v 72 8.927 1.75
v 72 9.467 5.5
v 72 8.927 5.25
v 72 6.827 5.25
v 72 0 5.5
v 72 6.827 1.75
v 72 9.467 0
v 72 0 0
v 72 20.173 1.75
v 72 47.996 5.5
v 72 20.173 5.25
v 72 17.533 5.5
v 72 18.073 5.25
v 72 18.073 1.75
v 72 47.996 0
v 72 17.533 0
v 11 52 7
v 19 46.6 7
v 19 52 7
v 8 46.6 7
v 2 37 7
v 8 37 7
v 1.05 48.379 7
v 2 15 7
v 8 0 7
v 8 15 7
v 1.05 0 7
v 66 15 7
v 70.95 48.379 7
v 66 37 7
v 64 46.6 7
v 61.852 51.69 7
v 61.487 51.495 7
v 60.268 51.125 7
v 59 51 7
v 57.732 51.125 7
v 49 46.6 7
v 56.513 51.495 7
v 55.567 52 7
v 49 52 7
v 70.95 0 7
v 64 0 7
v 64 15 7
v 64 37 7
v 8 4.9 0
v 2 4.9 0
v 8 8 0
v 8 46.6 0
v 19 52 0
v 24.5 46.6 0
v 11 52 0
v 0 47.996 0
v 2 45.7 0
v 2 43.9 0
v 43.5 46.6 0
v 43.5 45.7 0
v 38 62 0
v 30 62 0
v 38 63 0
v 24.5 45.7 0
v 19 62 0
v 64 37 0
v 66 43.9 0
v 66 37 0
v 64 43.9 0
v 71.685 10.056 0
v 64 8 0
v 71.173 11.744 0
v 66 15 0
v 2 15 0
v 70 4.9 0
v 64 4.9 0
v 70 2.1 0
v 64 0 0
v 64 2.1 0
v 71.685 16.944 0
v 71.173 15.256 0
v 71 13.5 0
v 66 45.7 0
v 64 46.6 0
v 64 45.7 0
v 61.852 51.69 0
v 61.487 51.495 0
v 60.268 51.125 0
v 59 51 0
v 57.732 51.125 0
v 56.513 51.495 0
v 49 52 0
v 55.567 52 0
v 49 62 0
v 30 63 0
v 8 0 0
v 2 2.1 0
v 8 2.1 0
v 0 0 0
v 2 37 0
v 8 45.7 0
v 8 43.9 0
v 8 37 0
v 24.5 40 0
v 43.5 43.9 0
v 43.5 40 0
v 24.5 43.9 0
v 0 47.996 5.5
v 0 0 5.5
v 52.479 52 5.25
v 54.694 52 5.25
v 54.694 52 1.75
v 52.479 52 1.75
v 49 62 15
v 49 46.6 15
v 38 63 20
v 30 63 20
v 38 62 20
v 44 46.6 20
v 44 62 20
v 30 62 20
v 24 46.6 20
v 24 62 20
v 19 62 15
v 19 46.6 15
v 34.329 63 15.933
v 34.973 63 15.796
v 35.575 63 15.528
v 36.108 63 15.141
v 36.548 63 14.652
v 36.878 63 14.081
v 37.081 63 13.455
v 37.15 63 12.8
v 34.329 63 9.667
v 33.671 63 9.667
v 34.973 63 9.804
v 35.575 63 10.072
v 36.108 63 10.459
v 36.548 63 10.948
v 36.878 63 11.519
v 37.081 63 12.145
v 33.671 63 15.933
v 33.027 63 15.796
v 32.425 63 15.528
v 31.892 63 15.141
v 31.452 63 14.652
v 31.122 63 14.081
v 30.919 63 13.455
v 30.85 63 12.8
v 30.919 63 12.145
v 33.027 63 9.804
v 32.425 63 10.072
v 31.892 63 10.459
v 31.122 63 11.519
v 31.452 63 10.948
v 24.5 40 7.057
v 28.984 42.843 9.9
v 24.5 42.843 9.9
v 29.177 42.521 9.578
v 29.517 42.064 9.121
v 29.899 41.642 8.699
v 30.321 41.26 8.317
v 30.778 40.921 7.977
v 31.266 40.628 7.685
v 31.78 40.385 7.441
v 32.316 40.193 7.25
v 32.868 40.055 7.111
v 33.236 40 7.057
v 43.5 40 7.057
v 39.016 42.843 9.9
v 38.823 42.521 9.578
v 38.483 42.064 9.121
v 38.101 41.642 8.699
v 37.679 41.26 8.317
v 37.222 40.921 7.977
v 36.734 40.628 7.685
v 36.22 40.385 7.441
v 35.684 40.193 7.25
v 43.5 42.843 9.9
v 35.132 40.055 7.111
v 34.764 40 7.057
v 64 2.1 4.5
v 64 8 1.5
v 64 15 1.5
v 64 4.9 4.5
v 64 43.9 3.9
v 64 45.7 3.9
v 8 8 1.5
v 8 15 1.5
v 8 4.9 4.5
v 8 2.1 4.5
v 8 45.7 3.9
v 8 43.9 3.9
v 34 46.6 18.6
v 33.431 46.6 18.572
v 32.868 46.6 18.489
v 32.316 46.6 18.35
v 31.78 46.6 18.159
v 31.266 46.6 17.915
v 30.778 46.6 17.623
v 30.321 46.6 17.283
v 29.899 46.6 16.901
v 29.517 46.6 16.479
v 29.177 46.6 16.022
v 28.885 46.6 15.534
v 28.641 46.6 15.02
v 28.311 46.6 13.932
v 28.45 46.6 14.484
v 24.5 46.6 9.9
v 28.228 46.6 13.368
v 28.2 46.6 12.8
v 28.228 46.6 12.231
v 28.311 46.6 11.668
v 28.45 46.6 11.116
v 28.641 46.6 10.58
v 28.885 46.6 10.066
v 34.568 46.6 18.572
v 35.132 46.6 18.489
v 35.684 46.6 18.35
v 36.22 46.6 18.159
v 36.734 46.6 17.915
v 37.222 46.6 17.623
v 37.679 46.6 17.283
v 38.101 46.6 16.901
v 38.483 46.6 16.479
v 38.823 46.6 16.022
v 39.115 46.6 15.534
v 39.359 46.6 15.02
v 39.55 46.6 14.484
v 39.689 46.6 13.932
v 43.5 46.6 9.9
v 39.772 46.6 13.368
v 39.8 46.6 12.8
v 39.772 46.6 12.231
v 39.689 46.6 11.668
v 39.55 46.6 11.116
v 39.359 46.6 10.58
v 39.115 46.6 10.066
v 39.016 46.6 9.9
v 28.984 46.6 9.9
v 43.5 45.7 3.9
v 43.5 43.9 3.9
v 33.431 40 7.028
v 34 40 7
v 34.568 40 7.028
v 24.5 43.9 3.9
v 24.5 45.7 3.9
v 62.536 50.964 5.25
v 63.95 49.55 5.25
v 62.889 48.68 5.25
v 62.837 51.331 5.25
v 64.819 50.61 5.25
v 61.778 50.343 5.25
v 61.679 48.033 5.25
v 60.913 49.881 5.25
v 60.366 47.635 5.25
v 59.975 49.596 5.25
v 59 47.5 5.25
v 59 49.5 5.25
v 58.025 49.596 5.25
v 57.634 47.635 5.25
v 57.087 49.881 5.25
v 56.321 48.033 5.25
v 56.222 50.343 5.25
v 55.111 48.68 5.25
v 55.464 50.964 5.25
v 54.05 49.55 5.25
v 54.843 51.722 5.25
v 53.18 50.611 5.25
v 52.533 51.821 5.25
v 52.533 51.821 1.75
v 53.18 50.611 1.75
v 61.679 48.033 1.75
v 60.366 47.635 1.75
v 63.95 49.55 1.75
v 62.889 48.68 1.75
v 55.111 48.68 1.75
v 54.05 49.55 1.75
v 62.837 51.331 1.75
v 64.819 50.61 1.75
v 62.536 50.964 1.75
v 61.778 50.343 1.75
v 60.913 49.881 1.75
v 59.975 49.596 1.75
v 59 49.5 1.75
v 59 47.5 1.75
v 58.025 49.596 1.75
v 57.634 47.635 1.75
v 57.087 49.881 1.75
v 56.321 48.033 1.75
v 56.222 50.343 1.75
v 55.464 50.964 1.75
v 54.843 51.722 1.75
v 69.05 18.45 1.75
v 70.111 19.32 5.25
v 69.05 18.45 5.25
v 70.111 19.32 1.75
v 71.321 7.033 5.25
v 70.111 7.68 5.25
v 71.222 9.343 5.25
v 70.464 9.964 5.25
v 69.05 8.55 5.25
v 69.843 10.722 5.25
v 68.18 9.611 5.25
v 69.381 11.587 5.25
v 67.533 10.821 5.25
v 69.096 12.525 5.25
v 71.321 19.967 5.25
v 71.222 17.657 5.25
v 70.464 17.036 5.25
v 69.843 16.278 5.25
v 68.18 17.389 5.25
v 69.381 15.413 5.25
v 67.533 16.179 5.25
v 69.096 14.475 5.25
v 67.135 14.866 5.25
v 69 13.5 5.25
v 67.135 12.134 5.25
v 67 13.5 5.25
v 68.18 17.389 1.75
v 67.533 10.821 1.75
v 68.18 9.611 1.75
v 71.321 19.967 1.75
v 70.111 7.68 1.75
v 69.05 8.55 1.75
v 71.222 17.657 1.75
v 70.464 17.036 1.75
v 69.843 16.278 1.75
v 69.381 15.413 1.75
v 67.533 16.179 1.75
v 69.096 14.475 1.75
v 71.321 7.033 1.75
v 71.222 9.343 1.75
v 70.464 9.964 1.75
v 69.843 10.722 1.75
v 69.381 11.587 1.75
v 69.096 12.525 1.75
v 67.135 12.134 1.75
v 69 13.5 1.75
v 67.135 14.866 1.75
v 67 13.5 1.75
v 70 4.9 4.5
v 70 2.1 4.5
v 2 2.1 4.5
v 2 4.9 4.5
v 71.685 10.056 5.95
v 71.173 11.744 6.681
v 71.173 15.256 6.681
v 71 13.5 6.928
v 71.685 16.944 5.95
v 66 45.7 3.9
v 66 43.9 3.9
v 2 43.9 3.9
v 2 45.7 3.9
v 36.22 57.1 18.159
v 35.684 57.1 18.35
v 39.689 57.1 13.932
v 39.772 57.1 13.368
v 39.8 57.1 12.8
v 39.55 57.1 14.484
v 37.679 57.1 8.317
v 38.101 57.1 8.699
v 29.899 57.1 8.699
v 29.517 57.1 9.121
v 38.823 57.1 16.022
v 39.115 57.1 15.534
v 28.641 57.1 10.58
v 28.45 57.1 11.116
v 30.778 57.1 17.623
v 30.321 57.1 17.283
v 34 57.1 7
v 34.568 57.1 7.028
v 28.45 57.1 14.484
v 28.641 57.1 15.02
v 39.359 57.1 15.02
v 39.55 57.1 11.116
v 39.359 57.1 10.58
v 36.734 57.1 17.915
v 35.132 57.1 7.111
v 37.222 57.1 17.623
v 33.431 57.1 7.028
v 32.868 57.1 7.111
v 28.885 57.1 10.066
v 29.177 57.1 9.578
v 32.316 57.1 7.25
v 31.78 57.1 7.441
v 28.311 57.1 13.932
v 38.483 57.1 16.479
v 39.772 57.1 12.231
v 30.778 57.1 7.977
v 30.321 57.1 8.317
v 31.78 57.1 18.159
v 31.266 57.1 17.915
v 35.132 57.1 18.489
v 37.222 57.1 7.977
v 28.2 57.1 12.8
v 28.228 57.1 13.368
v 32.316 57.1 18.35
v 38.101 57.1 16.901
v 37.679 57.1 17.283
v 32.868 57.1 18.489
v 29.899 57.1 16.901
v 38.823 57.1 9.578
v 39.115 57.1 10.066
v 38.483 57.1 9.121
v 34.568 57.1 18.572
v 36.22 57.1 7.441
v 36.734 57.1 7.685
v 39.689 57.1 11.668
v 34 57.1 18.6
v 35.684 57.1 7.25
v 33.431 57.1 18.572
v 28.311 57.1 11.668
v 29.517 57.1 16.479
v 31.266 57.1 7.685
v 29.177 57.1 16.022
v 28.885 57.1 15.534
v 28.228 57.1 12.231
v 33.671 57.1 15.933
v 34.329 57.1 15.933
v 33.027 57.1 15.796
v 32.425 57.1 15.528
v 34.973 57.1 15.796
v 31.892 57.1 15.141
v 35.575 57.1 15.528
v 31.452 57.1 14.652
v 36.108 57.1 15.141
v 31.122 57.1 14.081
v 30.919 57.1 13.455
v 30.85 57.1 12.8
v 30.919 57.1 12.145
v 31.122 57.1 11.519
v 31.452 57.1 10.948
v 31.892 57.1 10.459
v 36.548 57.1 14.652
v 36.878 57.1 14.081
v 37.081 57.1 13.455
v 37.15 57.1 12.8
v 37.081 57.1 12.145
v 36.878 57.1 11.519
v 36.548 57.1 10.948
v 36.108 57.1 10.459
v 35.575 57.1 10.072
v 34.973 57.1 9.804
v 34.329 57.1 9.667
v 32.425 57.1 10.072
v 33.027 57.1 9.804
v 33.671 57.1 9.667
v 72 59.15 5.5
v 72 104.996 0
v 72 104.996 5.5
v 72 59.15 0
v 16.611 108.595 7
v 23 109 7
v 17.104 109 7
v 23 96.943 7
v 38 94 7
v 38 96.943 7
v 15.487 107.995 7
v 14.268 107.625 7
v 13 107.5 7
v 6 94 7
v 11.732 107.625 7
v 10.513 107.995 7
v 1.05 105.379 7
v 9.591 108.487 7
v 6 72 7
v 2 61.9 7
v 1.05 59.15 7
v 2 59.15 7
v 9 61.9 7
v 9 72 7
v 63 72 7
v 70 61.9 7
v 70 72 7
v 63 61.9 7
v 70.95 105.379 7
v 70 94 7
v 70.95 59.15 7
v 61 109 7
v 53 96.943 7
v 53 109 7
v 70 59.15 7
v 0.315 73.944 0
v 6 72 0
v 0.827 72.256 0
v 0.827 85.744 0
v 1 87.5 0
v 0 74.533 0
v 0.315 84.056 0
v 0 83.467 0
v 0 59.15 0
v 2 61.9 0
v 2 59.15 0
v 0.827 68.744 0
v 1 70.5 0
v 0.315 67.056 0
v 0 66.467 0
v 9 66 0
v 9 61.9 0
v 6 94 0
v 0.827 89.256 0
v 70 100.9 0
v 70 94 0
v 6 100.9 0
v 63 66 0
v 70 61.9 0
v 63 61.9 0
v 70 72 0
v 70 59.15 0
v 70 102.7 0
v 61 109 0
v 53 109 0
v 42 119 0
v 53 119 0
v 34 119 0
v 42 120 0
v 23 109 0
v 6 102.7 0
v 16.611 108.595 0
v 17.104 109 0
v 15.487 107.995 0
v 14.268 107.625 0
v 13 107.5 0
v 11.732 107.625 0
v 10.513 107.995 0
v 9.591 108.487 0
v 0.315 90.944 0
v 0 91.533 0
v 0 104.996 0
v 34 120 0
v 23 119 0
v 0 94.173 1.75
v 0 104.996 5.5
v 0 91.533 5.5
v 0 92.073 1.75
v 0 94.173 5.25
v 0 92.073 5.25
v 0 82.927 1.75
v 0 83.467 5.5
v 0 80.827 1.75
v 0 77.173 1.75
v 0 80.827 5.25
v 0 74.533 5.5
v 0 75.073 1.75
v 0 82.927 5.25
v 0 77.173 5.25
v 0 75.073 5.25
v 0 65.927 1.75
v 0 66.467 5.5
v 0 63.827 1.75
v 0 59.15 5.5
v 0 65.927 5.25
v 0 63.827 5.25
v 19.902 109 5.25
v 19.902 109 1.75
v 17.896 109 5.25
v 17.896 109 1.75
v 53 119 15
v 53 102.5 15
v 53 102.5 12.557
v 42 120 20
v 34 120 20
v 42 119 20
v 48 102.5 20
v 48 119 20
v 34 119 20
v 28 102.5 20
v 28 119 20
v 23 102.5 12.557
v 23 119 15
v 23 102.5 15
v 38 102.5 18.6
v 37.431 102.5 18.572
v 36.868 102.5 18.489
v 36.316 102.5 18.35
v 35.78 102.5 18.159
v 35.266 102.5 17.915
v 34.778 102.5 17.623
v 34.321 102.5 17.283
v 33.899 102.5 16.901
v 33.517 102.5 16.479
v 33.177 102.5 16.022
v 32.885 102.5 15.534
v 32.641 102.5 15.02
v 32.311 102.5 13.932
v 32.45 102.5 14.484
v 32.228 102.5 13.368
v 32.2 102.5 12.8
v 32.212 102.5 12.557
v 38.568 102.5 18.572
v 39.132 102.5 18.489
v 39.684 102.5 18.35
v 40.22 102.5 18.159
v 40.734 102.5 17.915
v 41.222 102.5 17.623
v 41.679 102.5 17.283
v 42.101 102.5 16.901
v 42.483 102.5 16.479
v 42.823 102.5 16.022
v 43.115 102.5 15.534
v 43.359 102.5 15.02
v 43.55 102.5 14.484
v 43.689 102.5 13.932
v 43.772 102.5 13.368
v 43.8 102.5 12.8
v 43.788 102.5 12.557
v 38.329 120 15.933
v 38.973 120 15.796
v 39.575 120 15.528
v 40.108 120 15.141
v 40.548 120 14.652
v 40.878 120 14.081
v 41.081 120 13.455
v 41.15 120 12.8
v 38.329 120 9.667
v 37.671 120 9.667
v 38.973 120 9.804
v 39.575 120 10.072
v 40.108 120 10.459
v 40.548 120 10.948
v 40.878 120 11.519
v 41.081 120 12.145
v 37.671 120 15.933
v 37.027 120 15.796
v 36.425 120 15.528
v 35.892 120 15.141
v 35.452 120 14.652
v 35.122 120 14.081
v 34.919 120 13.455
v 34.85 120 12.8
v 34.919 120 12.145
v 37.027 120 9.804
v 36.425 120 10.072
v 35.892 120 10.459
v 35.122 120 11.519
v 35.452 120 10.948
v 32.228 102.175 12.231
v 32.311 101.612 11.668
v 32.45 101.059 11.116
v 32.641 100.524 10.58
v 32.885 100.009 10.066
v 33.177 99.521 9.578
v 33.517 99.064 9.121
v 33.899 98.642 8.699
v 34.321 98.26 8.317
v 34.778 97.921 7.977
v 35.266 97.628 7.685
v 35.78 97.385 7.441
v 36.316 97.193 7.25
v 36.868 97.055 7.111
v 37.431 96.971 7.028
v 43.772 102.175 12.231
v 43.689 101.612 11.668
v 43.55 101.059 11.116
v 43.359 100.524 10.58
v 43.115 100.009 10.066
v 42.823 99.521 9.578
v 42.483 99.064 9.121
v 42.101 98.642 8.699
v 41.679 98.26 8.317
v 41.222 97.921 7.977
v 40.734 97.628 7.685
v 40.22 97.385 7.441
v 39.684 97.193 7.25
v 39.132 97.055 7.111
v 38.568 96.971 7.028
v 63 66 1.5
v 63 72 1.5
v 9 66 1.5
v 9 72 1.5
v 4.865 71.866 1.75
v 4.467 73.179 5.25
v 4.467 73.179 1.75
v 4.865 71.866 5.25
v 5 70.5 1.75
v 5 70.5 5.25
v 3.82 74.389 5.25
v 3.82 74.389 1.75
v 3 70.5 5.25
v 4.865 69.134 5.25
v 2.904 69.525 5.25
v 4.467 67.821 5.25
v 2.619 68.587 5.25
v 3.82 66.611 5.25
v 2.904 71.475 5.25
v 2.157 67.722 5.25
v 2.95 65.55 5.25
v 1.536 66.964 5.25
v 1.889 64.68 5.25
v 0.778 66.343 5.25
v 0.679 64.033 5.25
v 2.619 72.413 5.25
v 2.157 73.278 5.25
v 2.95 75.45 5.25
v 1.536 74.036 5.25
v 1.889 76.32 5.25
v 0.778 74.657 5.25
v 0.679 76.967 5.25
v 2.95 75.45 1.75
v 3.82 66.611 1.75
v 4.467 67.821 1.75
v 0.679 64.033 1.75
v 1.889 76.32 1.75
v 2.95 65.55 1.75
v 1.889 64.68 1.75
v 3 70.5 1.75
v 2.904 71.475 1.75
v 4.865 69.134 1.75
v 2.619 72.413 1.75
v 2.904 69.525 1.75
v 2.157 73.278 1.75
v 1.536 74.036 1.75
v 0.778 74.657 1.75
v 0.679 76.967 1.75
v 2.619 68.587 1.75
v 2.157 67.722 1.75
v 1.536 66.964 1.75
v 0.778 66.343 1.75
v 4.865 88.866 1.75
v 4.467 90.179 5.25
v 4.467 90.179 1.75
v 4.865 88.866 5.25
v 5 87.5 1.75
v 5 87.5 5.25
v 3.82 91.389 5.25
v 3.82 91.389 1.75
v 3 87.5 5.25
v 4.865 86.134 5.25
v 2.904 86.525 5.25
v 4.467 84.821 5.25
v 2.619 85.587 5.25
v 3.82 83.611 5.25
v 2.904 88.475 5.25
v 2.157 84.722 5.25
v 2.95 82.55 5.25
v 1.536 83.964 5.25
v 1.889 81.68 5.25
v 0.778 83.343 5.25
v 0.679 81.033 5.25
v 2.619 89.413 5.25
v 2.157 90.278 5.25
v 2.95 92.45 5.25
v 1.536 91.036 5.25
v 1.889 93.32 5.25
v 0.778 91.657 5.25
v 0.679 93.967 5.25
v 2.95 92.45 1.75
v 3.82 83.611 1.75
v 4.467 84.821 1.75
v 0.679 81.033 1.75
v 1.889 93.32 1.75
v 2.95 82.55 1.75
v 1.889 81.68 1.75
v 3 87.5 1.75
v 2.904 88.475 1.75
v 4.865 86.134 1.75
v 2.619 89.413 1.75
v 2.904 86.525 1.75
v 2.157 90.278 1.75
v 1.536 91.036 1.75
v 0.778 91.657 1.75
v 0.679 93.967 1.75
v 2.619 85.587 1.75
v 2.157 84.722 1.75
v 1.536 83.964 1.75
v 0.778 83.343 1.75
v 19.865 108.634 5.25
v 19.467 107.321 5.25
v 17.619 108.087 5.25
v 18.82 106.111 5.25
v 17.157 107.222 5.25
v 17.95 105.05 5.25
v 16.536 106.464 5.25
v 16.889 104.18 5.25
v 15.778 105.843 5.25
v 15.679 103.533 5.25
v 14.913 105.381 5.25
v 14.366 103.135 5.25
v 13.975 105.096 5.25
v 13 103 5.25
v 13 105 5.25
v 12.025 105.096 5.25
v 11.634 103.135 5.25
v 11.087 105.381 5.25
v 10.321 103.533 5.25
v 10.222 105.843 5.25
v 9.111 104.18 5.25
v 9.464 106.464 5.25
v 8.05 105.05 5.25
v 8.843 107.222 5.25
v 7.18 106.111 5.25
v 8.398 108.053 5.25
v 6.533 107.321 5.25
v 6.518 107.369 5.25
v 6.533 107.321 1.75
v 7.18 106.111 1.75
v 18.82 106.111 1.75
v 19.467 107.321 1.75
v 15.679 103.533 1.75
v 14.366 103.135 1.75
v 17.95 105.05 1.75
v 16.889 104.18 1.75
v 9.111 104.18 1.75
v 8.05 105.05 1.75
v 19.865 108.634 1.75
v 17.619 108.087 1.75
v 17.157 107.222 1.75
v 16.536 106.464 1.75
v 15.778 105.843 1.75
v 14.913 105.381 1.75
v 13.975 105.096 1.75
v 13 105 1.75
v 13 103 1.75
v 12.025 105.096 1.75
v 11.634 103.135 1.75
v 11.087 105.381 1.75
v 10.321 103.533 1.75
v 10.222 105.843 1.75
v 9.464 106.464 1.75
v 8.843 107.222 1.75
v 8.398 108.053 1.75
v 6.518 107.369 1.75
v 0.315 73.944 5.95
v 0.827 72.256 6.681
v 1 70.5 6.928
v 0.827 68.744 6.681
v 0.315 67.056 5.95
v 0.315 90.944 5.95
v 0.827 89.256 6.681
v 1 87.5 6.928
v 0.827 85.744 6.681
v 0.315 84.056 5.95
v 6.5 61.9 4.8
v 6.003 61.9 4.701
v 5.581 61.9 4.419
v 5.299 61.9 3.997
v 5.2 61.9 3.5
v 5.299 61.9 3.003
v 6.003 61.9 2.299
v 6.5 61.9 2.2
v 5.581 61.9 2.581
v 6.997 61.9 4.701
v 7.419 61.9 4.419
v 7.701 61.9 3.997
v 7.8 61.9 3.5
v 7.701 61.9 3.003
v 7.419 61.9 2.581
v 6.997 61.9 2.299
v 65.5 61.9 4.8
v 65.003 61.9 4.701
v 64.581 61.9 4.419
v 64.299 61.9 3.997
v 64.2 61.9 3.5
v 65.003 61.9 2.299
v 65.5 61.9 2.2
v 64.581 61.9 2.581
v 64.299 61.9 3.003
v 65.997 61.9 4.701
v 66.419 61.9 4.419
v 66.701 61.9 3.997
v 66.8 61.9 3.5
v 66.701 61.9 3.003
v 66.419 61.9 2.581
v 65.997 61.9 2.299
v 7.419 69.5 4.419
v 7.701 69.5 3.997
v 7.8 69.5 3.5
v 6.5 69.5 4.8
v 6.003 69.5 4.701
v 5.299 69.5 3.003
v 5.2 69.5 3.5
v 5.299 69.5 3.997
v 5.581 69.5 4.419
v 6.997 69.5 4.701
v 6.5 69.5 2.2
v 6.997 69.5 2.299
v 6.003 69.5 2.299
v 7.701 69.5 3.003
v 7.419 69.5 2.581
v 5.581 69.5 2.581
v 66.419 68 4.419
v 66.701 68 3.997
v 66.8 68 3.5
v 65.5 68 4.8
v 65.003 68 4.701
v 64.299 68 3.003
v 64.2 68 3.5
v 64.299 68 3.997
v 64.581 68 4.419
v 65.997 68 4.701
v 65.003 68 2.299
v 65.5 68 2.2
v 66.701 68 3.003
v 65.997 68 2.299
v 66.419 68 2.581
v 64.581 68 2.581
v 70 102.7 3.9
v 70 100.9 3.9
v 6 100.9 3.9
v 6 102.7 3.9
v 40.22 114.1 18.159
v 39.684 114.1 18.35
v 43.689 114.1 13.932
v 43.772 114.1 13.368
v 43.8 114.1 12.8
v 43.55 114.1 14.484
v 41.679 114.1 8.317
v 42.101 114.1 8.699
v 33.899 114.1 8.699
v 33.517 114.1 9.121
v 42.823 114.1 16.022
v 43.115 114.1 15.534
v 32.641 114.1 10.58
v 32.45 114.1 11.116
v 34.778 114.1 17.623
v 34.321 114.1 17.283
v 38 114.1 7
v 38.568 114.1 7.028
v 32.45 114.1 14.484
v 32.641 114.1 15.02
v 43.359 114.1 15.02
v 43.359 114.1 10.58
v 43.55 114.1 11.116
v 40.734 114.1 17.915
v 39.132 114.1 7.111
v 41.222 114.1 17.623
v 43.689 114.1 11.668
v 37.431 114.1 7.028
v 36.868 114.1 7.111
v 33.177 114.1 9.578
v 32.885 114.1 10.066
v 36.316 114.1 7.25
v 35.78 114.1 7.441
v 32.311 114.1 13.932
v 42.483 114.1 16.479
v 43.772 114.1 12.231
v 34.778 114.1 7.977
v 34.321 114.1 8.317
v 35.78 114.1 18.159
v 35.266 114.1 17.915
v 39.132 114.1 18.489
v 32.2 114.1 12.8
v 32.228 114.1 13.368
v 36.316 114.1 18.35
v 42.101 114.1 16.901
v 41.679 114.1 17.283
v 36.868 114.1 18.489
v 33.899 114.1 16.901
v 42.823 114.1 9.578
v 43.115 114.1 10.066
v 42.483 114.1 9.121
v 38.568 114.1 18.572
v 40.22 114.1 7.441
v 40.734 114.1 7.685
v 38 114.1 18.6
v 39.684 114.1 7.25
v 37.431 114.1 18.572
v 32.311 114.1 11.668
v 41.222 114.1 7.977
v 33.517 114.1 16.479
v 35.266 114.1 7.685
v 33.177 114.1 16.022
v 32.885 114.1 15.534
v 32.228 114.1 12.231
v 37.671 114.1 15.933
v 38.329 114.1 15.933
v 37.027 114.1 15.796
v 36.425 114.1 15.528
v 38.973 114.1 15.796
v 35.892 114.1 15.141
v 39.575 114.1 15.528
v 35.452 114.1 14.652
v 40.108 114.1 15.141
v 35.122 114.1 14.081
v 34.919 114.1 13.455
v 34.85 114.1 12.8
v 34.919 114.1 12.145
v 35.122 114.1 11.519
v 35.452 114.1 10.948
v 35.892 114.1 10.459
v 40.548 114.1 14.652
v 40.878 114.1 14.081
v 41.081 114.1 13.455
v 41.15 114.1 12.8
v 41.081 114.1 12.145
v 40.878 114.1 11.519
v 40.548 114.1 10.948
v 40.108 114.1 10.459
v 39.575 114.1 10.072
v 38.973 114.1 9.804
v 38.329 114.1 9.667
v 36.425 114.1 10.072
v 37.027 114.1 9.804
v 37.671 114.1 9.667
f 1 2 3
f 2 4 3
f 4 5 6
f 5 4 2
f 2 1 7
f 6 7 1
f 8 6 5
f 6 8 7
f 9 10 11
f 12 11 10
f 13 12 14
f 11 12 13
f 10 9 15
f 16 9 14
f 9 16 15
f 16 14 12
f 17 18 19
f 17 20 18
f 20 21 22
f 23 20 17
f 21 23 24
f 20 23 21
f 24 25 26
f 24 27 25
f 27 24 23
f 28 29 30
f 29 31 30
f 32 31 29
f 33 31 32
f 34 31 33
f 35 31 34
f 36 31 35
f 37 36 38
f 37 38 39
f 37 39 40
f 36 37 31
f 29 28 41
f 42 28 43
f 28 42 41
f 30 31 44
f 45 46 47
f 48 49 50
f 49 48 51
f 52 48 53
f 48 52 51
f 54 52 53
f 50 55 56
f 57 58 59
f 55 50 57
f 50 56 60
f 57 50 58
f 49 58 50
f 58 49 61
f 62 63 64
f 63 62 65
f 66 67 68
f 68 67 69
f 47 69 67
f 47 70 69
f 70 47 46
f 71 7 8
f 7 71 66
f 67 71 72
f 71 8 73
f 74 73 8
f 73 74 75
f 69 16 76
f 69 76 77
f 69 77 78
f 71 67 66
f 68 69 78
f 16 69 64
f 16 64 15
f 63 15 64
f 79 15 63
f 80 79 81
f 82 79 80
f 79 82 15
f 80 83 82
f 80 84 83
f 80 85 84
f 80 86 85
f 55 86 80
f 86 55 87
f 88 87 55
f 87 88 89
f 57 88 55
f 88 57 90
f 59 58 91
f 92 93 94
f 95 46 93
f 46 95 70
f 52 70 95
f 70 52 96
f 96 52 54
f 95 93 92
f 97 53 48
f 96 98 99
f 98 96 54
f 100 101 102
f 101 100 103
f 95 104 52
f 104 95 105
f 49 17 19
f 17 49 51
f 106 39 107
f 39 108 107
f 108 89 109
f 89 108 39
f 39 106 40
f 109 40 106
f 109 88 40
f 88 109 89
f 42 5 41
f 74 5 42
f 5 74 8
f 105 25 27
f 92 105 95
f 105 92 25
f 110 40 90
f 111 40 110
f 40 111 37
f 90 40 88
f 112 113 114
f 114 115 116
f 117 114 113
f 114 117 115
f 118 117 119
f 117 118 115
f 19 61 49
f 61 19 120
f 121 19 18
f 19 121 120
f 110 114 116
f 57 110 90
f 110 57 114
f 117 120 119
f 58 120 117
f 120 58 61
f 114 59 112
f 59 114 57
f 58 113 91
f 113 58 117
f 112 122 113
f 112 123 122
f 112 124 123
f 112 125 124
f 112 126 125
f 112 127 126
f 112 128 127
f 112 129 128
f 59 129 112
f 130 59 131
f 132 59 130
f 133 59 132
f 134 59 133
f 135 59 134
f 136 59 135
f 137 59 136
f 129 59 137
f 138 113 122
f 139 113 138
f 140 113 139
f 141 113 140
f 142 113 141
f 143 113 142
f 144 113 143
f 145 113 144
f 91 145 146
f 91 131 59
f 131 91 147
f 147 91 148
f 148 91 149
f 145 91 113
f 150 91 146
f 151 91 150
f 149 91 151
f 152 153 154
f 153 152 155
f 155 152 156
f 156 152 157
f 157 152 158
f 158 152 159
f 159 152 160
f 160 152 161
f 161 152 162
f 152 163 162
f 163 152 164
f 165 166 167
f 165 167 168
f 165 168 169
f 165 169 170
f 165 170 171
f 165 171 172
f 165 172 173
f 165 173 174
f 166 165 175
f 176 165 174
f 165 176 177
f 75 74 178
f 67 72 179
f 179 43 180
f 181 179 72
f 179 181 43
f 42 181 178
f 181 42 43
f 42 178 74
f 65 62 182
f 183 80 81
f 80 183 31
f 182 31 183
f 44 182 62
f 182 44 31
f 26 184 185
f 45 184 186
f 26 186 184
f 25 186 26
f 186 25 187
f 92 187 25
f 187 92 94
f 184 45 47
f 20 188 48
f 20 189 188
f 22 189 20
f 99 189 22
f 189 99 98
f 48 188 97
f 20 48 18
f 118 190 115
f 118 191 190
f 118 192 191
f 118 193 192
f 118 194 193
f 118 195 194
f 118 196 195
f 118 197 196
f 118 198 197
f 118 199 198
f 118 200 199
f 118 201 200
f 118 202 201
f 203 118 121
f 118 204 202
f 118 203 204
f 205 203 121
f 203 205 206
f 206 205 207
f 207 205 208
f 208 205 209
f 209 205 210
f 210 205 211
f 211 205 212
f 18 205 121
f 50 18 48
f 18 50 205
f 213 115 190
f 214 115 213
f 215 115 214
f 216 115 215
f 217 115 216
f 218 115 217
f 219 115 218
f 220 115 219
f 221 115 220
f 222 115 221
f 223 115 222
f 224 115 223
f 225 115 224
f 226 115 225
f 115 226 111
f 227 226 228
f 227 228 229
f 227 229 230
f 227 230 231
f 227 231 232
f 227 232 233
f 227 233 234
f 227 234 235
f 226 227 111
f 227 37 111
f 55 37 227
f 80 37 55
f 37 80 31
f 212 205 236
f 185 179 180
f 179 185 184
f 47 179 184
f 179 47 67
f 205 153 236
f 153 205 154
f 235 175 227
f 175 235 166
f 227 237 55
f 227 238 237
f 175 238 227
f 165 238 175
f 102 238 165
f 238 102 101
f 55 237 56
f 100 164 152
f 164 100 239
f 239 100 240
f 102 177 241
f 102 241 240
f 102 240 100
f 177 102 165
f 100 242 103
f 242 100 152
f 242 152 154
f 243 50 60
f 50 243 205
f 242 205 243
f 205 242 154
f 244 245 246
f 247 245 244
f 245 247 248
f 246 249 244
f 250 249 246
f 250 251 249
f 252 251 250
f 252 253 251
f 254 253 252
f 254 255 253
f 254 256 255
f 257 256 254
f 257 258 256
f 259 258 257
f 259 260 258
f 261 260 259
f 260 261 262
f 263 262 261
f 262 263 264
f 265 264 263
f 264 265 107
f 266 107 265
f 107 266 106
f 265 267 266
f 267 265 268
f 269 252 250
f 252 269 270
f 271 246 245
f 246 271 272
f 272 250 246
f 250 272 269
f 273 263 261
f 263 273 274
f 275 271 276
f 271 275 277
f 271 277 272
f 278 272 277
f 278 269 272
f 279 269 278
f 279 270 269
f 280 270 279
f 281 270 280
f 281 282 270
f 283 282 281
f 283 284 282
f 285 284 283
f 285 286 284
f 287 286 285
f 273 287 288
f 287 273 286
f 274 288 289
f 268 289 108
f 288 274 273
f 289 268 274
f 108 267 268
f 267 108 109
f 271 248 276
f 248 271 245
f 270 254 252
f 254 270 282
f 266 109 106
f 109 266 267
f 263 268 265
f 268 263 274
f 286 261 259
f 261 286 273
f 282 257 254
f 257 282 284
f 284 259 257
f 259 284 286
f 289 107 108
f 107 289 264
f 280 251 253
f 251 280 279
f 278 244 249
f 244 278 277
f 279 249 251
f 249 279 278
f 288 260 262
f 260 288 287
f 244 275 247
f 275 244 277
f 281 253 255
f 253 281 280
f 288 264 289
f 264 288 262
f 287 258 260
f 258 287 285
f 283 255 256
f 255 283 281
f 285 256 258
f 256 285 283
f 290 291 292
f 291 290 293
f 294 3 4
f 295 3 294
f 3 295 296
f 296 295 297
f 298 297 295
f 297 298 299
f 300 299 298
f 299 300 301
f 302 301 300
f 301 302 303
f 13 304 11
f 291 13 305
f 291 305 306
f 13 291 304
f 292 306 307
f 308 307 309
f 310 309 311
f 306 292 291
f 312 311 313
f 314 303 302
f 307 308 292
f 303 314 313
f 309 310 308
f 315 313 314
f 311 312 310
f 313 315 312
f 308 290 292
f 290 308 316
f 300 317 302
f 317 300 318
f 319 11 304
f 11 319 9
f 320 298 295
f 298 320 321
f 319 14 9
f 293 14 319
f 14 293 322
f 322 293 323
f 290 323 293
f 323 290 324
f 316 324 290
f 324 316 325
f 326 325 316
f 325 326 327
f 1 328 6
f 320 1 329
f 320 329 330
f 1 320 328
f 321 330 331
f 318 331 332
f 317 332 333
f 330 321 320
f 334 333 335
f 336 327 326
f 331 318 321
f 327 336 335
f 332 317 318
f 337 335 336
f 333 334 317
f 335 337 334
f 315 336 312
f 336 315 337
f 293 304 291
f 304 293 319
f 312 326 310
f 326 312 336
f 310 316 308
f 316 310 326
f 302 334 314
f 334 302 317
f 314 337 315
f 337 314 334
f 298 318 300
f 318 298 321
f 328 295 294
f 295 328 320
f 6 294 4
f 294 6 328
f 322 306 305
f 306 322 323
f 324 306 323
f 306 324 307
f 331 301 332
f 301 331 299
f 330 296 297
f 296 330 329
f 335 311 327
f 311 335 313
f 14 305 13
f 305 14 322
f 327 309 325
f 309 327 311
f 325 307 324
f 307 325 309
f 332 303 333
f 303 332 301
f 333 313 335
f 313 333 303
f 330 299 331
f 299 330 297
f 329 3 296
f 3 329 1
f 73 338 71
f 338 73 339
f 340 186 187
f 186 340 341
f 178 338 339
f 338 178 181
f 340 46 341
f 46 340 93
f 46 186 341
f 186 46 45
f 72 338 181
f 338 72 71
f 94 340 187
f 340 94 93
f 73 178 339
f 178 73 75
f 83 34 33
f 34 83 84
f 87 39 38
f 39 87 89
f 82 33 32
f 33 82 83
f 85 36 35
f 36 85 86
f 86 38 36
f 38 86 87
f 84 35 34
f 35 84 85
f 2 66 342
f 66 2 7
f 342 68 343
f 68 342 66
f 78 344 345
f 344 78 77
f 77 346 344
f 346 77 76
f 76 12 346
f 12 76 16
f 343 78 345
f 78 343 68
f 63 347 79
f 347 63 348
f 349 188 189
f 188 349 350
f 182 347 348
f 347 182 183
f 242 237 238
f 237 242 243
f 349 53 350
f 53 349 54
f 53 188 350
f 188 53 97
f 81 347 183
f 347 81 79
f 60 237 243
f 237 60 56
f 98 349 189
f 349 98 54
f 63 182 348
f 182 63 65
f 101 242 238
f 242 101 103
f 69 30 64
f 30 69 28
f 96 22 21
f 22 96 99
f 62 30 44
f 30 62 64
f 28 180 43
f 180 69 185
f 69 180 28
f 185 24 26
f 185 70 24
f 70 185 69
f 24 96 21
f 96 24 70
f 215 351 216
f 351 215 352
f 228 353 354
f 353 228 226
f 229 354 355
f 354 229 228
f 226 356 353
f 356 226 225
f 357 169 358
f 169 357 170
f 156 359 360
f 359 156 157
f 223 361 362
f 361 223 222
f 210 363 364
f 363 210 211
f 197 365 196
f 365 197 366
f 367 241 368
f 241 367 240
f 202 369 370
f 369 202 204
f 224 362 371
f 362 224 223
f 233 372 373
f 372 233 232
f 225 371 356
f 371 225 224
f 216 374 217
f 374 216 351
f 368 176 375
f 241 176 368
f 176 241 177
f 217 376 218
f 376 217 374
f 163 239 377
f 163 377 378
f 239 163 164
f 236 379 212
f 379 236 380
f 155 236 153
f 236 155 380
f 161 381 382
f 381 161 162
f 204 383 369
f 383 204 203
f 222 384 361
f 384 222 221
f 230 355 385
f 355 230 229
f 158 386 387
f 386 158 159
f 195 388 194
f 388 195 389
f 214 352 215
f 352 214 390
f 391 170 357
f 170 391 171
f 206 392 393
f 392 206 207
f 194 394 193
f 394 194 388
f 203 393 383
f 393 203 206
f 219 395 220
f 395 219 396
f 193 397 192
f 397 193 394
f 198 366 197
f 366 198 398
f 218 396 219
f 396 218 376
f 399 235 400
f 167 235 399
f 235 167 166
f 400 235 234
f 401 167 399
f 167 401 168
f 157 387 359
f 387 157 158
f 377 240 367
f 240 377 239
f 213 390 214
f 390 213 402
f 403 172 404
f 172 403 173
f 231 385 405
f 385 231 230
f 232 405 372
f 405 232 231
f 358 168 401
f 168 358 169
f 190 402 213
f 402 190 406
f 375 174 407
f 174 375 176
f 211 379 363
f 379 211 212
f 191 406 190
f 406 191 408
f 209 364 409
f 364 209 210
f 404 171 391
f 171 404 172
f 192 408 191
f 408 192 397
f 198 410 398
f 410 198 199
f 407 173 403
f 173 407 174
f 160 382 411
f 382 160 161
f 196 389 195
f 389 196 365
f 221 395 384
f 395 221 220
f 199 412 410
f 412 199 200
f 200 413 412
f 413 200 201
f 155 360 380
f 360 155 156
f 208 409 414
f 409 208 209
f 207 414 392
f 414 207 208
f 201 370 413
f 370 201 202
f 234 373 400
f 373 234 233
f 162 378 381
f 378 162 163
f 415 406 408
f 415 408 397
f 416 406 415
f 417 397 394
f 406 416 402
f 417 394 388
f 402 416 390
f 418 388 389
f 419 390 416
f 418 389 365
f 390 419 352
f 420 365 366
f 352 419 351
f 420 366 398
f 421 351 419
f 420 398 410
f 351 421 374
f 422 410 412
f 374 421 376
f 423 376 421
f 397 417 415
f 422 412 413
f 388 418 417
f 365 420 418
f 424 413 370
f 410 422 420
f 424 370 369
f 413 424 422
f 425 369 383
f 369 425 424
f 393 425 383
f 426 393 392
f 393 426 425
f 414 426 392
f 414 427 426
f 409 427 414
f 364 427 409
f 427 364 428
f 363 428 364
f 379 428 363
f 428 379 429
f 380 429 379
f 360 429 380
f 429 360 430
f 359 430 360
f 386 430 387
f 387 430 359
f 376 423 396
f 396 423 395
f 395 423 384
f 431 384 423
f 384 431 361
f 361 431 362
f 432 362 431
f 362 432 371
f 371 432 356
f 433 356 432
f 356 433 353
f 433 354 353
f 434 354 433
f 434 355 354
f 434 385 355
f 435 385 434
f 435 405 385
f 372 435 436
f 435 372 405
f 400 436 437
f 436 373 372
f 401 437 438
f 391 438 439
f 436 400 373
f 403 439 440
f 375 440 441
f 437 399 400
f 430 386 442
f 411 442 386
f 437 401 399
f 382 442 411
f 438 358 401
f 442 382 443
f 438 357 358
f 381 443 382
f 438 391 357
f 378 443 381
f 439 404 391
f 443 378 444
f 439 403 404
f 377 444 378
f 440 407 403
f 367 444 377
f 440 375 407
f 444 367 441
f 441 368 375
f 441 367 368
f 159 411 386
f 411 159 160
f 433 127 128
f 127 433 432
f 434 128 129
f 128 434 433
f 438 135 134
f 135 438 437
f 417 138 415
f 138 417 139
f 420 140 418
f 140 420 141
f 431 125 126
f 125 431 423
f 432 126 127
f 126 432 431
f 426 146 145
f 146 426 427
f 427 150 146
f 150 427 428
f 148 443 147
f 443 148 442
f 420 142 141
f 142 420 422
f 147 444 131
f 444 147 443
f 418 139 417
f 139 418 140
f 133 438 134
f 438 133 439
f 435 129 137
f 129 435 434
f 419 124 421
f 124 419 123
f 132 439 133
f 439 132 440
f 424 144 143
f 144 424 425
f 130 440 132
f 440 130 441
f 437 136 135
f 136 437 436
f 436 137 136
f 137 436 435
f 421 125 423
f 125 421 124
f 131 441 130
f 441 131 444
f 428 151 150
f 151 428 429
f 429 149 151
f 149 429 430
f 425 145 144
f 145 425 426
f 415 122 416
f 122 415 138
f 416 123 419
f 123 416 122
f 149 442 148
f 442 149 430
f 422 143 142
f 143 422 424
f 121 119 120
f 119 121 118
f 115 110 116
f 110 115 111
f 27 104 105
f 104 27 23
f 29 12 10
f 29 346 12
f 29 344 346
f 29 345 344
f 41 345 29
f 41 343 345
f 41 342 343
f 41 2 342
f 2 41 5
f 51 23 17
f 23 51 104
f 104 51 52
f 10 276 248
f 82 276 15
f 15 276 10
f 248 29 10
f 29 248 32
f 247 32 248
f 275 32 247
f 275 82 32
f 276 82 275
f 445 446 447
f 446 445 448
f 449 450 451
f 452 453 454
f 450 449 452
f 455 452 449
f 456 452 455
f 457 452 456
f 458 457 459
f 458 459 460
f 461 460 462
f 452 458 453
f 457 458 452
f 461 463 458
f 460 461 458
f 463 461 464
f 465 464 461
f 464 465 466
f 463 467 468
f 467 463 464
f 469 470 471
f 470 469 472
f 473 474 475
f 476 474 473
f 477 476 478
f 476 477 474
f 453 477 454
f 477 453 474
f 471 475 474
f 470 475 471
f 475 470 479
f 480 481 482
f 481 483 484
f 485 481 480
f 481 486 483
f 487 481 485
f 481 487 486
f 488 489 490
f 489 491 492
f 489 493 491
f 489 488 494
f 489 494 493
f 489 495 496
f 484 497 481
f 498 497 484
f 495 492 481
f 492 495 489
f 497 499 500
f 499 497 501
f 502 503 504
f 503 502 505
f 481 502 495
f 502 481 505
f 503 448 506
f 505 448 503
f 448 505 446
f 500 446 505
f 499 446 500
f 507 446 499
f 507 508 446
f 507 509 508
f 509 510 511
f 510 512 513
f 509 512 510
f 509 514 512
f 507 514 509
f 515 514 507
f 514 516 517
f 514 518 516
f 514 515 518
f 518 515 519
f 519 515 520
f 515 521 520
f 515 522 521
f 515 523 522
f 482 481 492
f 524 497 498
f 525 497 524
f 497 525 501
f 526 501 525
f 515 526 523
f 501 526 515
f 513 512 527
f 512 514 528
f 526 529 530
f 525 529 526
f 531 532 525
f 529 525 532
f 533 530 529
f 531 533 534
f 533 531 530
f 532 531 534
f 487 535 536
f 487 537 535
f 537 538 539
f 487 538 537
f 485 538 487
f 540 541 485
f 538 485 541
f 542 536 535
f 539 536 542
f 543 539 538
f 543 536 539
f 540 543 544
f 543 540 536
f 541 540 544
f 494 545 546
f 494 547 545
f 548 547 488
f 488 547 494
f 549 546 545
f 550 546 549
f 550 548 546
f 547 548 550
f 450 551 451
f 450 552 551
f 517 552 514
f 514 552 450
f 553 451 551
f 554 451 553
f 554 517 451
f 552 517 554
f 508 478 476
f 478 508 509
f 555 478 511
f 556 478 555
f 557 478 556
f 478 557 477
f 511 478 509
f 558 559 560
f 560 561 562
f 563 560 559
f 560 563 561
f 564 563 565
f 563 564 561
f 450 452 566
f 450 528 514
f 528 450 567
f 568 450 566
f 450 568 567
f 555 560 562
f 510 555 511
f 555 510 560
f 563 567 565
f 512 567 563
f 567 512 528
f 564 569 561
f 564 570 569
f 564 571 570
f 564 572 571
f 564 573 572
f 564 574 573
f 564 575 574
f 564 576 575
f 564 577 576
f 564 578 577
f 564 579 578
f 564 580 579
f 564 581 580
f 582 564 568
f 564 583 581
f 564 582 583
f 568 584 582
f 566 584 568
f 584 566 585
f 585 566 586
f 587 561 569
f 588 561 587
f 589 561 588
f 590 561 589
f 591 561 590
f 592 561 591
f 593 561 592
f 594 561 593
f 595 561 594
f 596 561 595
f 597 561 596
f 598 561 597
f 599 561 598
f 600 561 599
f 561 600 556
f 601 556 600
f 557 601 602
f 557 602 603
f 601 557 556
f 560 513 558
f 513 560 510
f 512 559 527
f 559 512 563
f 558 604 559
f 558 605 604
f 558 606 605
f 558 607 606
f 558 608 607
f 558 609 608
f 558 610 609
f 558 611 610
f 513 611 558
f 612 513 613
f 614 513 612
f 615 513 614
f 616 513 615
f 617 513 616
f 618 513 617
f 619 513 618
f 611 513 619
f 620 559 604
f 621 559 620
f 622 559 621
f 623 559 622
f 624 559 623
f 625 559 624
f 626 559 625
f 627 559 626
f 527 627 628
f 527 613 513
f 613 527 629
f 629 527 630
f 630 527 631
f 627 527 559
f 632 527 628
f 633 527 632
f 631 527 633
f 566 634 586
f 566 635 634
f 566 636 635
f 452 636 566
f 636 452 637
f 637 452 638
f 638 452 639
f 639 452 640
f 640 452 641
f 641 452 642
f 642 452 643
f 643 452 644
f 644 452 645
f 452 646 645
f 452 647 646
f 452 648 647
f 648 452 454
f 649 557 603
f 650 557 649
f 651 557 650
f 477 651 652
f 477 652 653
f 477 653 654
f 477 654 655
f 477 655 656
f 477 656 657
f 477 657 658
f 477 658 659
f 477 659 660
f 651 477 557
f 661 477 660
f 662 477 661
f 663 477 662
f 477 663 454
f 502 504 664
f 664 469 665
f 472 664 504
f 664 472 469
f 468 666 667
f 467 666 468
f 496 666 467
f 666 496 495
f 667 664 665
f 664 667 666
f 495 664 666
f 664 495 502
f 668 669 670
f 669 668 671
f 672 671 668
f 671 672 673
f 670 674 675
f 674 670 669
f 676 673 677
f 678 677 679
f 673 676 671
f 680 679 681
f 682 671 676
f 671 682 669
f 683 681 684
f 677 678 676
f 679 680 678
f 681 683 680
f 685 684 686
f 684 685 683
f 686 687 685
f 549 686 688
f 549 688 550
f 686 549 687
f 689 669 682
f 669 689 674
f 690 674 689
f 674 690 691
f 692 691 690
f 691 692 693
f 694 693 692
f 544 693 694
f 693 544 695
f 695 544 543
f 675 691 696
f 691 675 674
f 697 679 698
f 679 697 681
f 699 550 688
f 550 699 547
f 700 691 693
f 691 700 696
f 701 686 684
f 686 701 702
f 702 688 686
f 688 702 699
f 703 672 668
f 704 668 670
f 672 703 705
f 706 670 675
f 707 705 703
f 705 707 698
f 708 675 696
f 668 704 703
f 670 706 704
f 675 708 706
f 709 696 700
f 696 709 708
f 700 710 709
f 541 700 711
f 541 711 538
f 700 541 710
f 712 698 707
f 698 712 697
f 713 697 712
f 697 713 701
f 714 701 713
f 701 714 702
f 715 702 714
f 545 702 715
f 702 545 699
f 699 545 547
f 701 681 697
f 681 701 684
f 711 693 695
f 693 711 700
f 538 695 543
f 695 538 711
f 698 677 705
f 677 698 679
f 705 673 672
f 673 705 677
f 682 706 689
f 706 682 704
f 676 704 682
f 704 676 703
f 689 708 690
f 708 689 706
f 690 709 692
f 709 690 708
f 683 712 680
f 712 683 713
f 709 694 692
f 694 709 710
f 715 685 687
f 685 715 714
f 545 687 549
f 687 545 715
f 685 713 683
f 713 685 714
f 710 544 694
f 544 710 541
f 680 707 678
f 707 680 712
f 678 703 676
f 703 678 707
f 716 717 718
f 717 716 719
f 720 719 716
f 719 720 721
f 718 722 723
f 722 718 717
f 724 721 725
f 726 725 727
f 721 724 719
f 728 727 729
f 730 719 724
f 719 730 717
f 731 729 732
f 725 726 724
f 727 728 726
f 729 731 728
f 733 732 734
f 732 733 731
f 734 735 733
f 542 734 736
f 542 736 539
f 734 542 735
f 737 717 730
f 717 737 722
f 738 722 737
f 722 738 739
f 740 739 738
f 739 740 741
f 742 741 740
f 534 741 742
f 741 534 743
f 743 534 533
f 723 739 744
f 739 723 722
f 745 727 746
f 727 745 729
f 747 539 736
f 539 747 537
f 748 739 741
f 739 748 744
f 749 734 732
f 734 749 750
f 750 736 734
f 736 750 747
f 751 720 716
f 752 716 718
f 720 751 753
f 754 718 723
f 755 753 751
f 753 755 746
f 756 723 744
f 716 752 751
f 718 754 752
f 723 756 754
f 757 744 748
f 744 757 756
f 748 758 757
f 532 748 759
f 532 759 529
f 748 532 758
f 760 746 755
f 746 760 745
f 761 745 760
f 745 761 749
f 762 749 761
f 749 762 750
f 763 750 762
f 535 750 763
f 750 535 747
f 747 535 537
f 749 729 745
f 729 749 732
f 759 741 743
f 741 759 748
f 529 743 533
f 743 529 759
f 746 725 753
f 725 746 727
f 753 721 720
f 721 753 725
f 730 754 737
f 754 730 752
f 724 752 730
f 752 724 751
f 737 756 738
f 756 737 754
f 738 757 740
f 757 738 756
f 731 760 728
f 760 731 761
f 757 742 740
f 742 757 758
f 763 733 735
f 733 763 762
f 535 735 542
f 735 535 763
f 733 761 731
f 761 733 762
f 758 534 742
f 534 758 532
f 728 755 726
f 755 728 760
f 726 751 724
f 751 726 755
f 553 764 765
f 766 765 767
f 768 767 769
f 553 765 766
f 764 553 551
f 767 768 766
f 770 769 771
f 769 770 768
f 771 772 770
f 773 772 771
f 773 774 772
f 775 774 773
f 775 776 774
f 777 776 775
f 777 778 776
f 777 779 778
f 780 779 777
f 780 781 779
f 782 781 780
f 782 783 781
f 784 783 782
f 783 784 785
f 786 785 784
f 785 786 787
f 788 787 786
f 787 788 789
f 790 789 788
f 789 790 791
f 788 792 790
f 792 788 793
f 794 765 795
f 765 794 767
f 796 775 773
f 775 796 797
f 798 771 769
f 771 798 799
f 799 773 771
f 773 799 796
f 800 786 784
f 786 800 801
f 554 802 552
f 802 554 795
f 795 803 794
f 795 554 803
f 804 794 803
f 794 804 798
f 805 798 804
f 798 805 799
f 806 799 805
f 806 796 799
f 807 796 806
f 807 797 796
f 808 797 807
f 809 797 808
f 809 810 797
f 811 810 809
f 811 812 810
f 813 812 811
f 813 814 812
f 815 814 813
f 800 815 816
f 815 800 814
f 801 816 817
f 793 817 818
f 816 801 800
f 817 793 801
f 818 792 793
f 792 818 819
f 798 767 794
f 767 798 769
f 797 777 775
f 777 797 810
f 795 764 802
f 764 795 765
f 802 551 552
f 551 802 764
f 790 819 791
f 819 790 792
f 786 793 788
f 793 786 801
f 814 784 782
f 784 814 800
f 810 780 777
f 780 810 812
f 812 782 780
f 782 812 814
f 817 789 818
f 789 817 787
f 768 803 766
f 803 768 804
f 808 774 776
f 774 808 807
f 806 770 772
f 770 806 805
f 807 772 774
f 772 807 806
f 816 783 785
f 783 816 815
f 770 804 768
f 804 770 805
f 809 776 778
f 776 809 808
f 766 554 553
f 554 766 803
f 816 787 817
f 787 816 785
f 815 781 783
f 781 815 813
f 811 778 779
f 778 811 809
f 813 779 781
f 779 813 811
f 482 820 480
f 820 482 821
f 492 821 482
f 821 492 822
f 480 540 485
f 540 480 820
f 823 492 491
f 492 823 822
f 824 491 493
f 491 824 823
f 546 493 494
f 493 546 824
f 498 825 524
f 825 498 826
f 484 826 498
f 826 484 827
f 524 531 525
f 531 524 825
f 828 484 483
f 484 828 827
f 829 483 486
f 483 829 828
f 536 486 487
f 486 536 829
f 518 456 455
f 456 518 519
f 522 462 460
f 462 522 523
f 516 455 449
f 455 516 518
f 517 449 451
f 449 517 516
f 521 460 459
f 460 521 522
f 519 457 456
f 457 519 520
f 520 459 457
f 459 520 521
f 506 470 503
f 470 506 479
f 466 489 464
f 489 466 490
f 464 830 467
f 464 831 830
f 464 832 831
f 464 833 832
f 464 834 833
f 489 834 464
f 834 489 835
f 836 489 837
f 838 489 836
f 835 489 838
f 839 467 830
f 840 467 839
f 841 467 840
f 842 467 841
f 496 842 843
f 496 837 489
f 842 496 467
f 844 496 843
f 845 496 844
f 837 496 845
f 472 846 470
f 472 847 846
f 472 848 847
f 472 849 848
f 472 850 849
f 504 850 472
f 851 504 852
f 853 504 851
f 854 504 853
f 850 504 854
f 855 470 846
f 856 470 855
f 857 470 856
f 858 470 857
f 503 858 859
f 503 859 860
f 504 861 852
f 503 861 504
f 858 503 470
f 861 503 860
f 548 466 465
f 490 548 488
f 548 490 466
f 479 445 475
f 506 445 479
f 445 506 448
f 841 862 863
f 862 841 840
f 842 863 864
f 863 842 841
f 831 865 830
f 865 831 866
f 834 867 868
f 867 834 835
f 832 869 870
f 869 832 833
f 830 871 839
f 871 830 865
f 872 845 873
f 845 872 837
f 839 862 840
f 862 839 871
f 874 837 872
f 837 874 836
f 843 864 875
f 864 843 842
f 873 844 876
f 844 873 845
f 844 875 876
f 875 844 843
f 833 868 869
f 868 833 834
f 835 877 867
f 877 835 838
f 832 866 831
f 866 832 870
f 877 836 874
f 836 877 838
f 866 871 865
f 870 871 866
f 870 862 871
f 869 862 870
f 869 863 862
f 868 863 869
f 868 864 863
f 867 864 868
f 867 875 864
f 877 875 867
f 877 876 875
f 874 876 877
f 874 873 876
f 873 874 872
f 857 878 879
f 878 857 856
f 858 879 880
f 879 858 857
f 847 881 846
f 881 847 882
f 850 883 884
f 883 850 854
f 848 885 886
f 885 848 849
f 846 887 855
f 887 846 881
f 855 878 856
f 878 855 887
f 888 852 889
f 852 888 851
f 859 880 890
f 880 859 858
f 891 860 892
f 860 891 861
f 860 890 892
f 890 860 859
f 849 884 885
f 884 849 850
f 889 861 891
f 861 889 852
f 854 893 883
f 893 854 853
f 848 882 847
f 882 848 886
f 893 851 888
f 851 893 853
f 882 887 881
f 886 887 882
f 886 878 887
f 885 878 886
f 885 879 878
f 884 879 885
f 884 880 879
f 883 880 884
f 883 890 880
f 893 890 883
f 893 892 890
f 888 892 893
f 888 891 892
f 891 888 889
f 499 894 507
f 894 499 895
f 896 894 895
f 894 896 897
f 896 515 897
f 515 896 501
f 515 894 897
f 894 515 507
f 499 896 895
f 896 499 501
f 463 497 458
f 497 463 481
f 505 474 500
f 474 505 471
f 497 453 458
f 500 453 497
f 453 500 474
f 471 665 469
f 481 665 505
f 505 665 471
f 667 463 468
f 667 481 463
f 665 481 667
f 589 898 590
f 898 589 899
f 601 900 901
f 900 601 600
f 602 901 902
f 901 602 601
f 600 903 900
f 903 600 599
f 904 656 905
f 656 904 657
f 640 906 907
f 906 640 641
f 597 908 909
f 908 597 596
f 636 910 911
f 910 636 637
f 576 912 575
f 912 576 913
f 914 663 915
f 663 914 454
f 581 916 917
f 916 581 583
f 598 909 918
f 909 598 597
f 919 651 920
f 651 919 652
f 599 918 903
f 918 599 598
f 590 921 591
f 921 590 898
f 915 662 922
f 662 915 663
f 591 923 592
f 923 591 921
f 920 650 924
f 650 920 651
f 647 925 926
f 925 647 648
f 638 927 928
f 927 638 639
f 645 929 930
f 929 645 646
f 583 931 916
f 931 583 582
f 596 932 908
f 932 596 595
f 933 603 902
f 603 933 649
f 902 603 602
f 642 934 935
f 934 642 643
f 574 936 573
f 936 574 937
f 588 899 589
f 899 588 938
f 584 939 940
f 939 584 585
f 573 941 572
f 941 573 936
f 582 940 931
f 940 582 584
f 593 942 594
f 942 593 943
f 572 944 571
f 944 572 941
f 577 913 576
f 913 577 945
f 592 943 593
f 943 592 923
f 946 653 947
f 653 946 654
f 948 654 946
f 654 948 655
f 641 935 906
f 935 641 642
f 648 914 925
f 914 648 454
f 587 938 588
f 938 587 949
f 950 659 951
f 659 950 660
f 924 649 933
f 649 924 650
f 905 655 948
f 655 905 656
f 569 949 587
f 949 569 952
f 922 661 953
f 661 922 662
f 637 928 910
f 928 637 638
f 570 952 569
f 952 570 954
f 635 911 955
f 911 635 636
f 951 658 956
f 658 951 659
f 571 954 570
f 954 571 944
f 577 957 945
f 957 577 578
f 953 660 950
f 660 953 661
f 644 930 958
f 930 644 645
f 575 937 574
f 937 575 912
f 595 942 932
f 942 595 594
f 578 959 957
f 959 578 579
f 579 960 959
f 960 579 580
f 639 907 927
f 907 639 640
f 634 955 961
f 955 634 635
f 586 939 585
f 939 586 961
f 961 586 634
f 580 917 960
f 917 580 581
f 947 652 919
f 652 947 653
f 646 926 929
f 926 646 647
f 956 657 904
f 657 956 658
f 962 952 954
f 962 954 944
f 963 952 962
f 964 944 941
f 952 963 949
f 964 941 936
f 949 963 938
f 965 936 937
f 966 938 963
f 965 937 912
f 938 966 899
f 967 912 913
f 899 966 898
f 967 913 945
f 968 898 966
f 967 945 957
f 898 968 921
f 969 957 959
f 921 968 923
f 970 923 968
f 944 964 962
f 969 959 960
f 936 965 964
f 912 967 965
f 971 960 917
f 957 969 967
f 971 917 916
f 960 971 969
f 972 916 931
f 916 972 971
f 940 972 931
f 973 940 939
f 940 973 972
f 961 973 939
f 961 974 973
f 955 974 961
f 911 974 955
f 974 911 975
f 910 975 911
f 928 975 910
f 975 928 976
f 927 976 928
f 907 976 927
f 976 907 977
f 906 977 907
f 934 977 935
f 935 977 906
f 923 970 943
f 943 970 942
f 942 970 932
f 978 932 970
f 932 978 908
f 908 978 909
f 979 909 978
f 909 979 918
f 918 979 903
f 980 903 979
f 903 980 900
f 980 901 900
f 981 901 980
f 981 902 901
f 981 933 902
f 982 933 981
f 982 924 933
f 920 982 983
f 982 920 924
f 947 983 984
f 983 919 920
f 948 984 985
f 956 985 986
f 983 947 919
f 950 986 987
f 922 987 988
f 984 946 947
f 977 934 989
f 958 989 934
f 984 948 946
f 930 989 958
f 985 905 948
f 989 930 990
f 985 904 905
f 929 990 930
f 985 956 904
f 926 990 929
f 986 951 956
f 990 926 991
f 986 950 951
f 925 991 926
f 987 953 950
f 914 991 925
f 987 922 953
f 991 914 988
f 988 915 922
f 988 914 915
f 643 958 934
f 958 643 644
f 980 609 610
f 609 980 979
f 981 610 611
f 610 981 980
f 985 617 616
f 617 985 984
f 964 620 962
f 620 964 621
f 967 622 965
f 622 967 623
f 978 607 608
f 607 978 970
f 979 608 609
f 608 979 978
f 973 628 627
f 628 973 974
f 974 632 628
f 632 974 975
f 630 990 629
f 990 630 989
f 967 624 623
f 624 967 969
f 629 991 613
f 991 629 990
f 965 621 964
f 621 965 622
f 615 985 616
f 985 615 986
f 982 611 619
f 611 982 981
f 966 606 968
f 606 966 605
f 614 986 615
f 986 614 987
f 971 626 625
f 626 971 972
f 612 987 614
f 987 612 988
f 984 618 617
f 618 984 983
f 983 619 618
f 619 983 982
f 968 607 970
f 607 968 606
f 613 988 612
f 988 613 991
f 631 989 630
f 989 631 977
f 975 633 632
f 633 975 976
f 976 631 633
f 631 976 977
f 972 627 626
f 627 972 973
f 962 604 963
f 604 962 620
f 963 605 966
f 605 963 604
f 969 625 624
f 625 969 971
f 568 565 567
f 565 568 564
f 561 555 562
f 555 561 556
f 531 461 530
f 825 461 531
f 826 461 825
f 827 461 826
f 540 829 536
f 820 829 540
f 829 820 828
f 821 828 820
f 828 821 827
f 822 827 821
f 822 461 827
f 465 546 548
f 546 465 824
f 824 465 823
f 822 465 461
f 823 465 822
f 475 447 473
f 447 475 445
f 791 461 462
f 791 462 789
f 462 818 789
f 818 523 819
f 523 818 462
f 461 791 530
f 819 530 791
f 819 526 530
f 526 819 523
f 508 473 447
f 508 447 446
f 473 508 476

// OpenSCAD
// file: ../../../configuration.scad
/*
	Konfiguracni soubor 3D tiskarny RebeliX X2
	
	Sledujte nas na:		  
			www.RepRap4U.cz
			www.facebook.com/RebeliX.cz
			https://twitter.com/reprap4u
			https://plus.google.com/+Reprap4uCz-3Dtiskarna-RebeliX
*/

/*================ Slic3r nastaveni ==========================*/

// Vyska vrstvy pro tisknuti dilu [mm]
layer_height = 0.3;

// Sirka vytlacovaneho materialu [mm]
extrusion_width = 0.66; //Slic3r->Print Settings->Advanced->Default extrusion width

/*==================== M6 sroub ==============================*/

// Rezerva prumeru hlavy sroubu [mm]
space = 1;

// Prumer hlavy M6 sroubu (pricte se rezerva) [mm]
M6_head_diameter = 10.6+space;
//M6_head_diameter = 12+space;

// Prumer M6 sroubu
M6_dia = 6.3;

// Vyska hlavy M6 sroubu (dulezite pro zapusteni hlavy sroubu do plastu) [mm]
M6_head_height = 3.6;
//M6_head_height = 4.5;

// Delka sroubu M6 [mm]
// M6x12
M6_lenght = 12;

// Sirka matky do profilu (pokud neni pouzita, tak 0)
//profile_nut_width = 9.5;
profile_nut_width = 0;

/*=================== Nastaveni dilu =========================*/

// Posun Z zakladny
z_base_offset = 11;

// Tloustka rohovych spojek
// 5 mm => sroub M6x14 s podlozkou
// 3 mm => sroub M6x12 s podlozkou
coupler_thickness = 3;

// Prumer 8mm tyce
rod_8mm_d = 8.2;

// Posun drzacku mezi x-motor a x-end
x_holder_position = 6.5;

// ALU profile hole width
alu_hole_width = 8;

/*======================== Motory ============================*/

// Delka motoru (ovlivni dily a delky tyci pro osy Z a Y)
//SX17-1003LQFE (doporuceno hlavne na osu Z)
motor_length = 29.5;
//SX17-1003 (doporuceno hlavne na osu Z), SX17-0503LQEF
//motor_length = 34;
//SX17-1005
//motor_length = 40;
//SX17-0905 - zde je jiz problem s velkou vyskou motoru na ose Z - musi se upravit endstop-holder
//motor_length = 48;

/*================ Remeny a remenicky ========================*/

// GT2 
belt_tooth_distance = 2;
belt_tooth_ratio = 0.5;

// T2.5
//belt_tooth_distance = 2.5;
//belt_tooth_ratio = 0.68;
// main file
// RebeliX
//
// RAMPS mini drzak
// GNU GPL v3
// Martin Neruda <neruda@reprap4u.cz>
// http://www.reprap4u.cz

include <../../../configuration.scad>

box_sirka = 72;
box_vyska = 52;
PCB_tloustka = 1.9;
holder_offset = 10;
offset_zakladny = 2;

module holder_base(vyska,sirka,delka,pozice)
{
	offset_zakladny = pozice == 1 ? offset_zakladny : -offset_zakladny;

	// Drzak Arduina
	translate([0,0,0]) cube([sirka,delka,vyska]);
	// Pridelani do profilu
	translate([sirka/2-15+offset_zakladny,delka-6.5,0]) cube([30,6.5+holder_offset,20]);
	// Vodici lista
	translate([sirka/2-4+offset_zakladny,delka-1,0]) cube([8,2+holder_offset,20]);
	// Vystuha
	translate([sirka/2+offset_zakladny,delka-6.4,7]) rotate([45,0,0]) cube([30,8,8], center=true);
}

module top_holder_cuts(vyska,delka,sirka,pozice){

	offset_zakladny = pozice == 1 ? offset_zakladny : -offset_zakladny;

	// Vyrez pro Arduino PCB
	translate([sirka/2 - 64/2 + offset_zakladny,box_vyska-8.1,-0.1]) cube([64,1.8,4]);
	// Vyrez pro RAMPS
	translate([box_sirka/2 + offset_zakladny,box_vyska-8-10-5.5-2.5,-0.1]) rotate([0,0,180]) cube([64,17+5,2*15], center=true);
	// Otvor pro M6 sroub
	translate([sirka/2+offset_zakladny,delka-6+M6_head_height+holder_offset-2.5,vyska+M6_head_diameter/2]) rotate([90,0,0]) cylinder(r=M6_head_diameter/2,h=30,$fn=64);
	translate([sirka/2+offset_zakladny,delka,vyska+M6_head_diameter/2]) rotate([90,0,0]) cylinder(r=M6_dia/2,h=50,$fn=30,center=true);
	// Vyrez vrchniho dilu
	if (pozice == 1) 
	{	
		difference() 
		{
		  translate([9,-0.1,-0.1]) cube([box_sirka-18,box_vyska-15,vyska+1]);
		  translate([0,9,0]) cube([box_sirka,11,1.5]);
		}
		// Zip pasky
		translate([-2,13.5,vyska/2 - 3.5/2]) zip_paska(7);
		translate([-2,30.5,vyska/2 - 3.5/2]) zip_paska(7);
		translate([13,box_vyska+1,vyska/2 - 3.5/2]) zip_paska(7);
		
		//Vyrez pro kabely
		translate([-8,13.5,-0.1]) cylinder(r=9,h=10,$fn=32);
		translate([-8,30.5,-0.1]) cylinder(r=9,h=10,$fn=32);
		translate([13,box_vyska+5,-0.1]) cylinder(r=6.5,h=10,$fn=32);
		
		// Vyrez pro kryci mrizku
		translate([box_sirka/2,3.5,vyska/2]) cube([box_sirka-4,2.8,vyska+0.1],center=true);
		translate([box_sirka/2,3.5-2.8,vyska/2]) cube([box_sirka+1,2.9,vyska+0.1],center=true);
		
		// Vyrez pro sroubky
		translate([box_sirka/2 - 66/2 + 3.5,5,vyska/2]) rotate([90,0,0]) cylinder(r=1.3,h=15,$fn=16,center=true);
		translate([box_sirka/2 + 66/2 - 3.5,3.5,vyska/2]) rotate([90,0,0]) cylinder(r=1.3,h=15,$fn=16,center=true);
	}
	// Vyrez spodni dil
	if (pozice == 0) 
	{	
	  difference()
	  {
	    translate([8,-0.1,-0.1]) cube([box_sirka-16,box_vyska-7.2+PCB_tloustka,30]);
		translate([0,8,0]) cube([box_sirka,8,1.5]);
	    translate([sirka/2+offset_zakladny,box_vyska,-0.1]) rotate([0,0,180]) cube([19,24,20], center=true);
	  }
	  // Vyrez pro kryci mrizku
	  translate([box_sirka/2,3.5,0]) cube([box_sirka-4,2.8,vyska+2],center=true);
	  // Zip pasky
	  translate([box_sirka-13,box_vyska+2.5,vyska/2 - 3.5/2]) zip_paska(7);
	  translate([sirka+2,13.5,vyska/2 - 3.5/2]) zip_paska(7);
	  //Vyrez pro kabely
	  translate([box_sirka-13,box_vyska+5.5,0]) cylinder(r=6.5,h=30,$fn=32,center=true);
	  translate([sirka+8,13.5,-0.1]) cylinder(r=9,h=10,$fn=32);
	}

	// Uspora plastu
	// Seriznute rohy
	translate([sirka/2 - 15+offset_zakladny,delka-10,20-5]) rotate([0,-45,0]) cube([10,holder_offset+15,10]);
	translate([sirka/2 + 15+offset_zakladny,delka-10,20-5]) rotate([0,-45,0]) cube([10,holder_offset+15,10]);

	translate([0,-0.1,vyska-1.5]) rotate([0,-55,0]) cube([30,60,30]);
	translate([sirka,-0.1,vyska-1.5]) rotate([0,-35,0]) cube([30,60,30]);
	
	// Rohy zakladny
	translate([box_sirka/2 - 25,box_vyska,-0.1]) rotate([0,0,110]) cube([15,40,15]);
	translate([box_sirka/2 + 25,box_vyska,-0.1]) rotate([0,0,-20]) cube([40,15,15]);
	
	// Vyrez pro profilovou matku 
    translate([sirka/2+offset_zakladny,delka + holder_offset + 3,vyska+M6_head_diameter/2]) cube([10,6,profile_nut_width],center=true);

	// Seriznuti pro snazsi tisk
	 if(profile_nut_width != 0)
	{
	  translate([sirka/2+offset_zakladny - 15,delka + holder_offset,vyska+M6_head_diameter/2+profile_nut_width/2]) rotate([-40,0,0]) cube([30,3,8]);
	}	
}

module zip_paska(r_vnejsi)
{
  difference()
  {
    cylinder(r=r_vnejsi,h=3.5,$fn=32);
    cylinder(r=r_vnejsi-2,h=3.5,$fn=32);
  }
}

// Spodek
module RAMPS_holder_bottom()
{
  difference()
  {
	holder_base(7,box_sirka,box_vyska,0);
	top_holder_cuts(7,box_vyska,box_sirka,0);
  }
}

// Vrsek
module RAMPS_holder_top()
{
  difference()
  {
	holder_base(7,box_sirka,box_vyska,1);
	top_holder_cuts(7,box_vyska,box_sirka,1);
  }
}

RAMPS_holder_bottom();
translate([0,box_vyska+holder_offset - 5,0]) 
RAMPS_holder_top();
